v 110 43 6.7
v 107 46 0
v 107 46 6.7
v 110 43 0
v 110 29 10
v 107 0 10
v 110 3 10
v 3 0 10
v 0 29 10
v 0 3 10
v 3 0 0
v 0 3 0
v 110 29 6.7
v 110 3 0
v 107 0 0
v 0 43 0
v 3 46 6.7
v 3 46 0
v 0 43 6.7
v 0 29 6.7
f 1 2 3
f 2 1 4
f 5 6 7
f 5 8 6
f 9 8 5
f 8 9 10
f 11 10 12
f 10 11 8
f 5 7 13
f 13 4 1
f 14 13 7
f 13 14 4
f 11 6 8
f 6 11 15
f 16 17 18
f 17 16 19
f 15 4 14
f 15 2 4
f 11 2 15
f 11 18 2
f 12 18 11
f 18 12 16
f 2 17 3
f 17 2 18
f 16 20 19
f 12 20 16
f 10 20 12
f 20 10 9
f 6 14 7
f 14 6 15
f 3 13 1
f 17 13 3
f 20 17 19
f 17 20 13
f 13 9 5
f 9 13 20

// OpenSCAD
$fn = 32;

// ----------------------------------------------------------------------
// Stepped bar: sidestep, 110 x 46 x 10/6.7 mm
// ----------------------------------------------------------------------

// --- parameters (mm) ---
bar_l = 110;              // bar length, X
bar_w = 46;               // bar width, Y
plate_t = 10;             // thickness of the thick zone, Z
thin_t = 6.7;             // thickness of the thin zone
corner_c = 3;             // corner chamfer of the bar
step_cut = 3.3;           // material removed from the thin zone
ledge_y = 29;             // start of the ledge from the front edge
depth_1 = 3.3;            // depth of cut 1 from the top face
fit_tol = 0.02;           // declared fit tolerance (prompt contract)
free_tol = 0.2;           // declared free tolerance (prompt contract)

profile = [[3, 0], [107, 0], [110, 3], [110, 43], [107, 46], [3, 46], [0, 43], [0, 3]];  // primary outline, 8 points, counter clockwise
void_1 = [[-1, 29], [111, 29], [111, 47], [-1, 47]];  // ledge cut along one edge, 4 points

// --- the one profile operation ---
difference() {
  linear_extrude(height = plate_t) polygon(points = profile);
  translate([0, 0, plate_t - depth_1])
    linear_extrude(height = depth_1 + 1) polygon(points = void_1);
}
